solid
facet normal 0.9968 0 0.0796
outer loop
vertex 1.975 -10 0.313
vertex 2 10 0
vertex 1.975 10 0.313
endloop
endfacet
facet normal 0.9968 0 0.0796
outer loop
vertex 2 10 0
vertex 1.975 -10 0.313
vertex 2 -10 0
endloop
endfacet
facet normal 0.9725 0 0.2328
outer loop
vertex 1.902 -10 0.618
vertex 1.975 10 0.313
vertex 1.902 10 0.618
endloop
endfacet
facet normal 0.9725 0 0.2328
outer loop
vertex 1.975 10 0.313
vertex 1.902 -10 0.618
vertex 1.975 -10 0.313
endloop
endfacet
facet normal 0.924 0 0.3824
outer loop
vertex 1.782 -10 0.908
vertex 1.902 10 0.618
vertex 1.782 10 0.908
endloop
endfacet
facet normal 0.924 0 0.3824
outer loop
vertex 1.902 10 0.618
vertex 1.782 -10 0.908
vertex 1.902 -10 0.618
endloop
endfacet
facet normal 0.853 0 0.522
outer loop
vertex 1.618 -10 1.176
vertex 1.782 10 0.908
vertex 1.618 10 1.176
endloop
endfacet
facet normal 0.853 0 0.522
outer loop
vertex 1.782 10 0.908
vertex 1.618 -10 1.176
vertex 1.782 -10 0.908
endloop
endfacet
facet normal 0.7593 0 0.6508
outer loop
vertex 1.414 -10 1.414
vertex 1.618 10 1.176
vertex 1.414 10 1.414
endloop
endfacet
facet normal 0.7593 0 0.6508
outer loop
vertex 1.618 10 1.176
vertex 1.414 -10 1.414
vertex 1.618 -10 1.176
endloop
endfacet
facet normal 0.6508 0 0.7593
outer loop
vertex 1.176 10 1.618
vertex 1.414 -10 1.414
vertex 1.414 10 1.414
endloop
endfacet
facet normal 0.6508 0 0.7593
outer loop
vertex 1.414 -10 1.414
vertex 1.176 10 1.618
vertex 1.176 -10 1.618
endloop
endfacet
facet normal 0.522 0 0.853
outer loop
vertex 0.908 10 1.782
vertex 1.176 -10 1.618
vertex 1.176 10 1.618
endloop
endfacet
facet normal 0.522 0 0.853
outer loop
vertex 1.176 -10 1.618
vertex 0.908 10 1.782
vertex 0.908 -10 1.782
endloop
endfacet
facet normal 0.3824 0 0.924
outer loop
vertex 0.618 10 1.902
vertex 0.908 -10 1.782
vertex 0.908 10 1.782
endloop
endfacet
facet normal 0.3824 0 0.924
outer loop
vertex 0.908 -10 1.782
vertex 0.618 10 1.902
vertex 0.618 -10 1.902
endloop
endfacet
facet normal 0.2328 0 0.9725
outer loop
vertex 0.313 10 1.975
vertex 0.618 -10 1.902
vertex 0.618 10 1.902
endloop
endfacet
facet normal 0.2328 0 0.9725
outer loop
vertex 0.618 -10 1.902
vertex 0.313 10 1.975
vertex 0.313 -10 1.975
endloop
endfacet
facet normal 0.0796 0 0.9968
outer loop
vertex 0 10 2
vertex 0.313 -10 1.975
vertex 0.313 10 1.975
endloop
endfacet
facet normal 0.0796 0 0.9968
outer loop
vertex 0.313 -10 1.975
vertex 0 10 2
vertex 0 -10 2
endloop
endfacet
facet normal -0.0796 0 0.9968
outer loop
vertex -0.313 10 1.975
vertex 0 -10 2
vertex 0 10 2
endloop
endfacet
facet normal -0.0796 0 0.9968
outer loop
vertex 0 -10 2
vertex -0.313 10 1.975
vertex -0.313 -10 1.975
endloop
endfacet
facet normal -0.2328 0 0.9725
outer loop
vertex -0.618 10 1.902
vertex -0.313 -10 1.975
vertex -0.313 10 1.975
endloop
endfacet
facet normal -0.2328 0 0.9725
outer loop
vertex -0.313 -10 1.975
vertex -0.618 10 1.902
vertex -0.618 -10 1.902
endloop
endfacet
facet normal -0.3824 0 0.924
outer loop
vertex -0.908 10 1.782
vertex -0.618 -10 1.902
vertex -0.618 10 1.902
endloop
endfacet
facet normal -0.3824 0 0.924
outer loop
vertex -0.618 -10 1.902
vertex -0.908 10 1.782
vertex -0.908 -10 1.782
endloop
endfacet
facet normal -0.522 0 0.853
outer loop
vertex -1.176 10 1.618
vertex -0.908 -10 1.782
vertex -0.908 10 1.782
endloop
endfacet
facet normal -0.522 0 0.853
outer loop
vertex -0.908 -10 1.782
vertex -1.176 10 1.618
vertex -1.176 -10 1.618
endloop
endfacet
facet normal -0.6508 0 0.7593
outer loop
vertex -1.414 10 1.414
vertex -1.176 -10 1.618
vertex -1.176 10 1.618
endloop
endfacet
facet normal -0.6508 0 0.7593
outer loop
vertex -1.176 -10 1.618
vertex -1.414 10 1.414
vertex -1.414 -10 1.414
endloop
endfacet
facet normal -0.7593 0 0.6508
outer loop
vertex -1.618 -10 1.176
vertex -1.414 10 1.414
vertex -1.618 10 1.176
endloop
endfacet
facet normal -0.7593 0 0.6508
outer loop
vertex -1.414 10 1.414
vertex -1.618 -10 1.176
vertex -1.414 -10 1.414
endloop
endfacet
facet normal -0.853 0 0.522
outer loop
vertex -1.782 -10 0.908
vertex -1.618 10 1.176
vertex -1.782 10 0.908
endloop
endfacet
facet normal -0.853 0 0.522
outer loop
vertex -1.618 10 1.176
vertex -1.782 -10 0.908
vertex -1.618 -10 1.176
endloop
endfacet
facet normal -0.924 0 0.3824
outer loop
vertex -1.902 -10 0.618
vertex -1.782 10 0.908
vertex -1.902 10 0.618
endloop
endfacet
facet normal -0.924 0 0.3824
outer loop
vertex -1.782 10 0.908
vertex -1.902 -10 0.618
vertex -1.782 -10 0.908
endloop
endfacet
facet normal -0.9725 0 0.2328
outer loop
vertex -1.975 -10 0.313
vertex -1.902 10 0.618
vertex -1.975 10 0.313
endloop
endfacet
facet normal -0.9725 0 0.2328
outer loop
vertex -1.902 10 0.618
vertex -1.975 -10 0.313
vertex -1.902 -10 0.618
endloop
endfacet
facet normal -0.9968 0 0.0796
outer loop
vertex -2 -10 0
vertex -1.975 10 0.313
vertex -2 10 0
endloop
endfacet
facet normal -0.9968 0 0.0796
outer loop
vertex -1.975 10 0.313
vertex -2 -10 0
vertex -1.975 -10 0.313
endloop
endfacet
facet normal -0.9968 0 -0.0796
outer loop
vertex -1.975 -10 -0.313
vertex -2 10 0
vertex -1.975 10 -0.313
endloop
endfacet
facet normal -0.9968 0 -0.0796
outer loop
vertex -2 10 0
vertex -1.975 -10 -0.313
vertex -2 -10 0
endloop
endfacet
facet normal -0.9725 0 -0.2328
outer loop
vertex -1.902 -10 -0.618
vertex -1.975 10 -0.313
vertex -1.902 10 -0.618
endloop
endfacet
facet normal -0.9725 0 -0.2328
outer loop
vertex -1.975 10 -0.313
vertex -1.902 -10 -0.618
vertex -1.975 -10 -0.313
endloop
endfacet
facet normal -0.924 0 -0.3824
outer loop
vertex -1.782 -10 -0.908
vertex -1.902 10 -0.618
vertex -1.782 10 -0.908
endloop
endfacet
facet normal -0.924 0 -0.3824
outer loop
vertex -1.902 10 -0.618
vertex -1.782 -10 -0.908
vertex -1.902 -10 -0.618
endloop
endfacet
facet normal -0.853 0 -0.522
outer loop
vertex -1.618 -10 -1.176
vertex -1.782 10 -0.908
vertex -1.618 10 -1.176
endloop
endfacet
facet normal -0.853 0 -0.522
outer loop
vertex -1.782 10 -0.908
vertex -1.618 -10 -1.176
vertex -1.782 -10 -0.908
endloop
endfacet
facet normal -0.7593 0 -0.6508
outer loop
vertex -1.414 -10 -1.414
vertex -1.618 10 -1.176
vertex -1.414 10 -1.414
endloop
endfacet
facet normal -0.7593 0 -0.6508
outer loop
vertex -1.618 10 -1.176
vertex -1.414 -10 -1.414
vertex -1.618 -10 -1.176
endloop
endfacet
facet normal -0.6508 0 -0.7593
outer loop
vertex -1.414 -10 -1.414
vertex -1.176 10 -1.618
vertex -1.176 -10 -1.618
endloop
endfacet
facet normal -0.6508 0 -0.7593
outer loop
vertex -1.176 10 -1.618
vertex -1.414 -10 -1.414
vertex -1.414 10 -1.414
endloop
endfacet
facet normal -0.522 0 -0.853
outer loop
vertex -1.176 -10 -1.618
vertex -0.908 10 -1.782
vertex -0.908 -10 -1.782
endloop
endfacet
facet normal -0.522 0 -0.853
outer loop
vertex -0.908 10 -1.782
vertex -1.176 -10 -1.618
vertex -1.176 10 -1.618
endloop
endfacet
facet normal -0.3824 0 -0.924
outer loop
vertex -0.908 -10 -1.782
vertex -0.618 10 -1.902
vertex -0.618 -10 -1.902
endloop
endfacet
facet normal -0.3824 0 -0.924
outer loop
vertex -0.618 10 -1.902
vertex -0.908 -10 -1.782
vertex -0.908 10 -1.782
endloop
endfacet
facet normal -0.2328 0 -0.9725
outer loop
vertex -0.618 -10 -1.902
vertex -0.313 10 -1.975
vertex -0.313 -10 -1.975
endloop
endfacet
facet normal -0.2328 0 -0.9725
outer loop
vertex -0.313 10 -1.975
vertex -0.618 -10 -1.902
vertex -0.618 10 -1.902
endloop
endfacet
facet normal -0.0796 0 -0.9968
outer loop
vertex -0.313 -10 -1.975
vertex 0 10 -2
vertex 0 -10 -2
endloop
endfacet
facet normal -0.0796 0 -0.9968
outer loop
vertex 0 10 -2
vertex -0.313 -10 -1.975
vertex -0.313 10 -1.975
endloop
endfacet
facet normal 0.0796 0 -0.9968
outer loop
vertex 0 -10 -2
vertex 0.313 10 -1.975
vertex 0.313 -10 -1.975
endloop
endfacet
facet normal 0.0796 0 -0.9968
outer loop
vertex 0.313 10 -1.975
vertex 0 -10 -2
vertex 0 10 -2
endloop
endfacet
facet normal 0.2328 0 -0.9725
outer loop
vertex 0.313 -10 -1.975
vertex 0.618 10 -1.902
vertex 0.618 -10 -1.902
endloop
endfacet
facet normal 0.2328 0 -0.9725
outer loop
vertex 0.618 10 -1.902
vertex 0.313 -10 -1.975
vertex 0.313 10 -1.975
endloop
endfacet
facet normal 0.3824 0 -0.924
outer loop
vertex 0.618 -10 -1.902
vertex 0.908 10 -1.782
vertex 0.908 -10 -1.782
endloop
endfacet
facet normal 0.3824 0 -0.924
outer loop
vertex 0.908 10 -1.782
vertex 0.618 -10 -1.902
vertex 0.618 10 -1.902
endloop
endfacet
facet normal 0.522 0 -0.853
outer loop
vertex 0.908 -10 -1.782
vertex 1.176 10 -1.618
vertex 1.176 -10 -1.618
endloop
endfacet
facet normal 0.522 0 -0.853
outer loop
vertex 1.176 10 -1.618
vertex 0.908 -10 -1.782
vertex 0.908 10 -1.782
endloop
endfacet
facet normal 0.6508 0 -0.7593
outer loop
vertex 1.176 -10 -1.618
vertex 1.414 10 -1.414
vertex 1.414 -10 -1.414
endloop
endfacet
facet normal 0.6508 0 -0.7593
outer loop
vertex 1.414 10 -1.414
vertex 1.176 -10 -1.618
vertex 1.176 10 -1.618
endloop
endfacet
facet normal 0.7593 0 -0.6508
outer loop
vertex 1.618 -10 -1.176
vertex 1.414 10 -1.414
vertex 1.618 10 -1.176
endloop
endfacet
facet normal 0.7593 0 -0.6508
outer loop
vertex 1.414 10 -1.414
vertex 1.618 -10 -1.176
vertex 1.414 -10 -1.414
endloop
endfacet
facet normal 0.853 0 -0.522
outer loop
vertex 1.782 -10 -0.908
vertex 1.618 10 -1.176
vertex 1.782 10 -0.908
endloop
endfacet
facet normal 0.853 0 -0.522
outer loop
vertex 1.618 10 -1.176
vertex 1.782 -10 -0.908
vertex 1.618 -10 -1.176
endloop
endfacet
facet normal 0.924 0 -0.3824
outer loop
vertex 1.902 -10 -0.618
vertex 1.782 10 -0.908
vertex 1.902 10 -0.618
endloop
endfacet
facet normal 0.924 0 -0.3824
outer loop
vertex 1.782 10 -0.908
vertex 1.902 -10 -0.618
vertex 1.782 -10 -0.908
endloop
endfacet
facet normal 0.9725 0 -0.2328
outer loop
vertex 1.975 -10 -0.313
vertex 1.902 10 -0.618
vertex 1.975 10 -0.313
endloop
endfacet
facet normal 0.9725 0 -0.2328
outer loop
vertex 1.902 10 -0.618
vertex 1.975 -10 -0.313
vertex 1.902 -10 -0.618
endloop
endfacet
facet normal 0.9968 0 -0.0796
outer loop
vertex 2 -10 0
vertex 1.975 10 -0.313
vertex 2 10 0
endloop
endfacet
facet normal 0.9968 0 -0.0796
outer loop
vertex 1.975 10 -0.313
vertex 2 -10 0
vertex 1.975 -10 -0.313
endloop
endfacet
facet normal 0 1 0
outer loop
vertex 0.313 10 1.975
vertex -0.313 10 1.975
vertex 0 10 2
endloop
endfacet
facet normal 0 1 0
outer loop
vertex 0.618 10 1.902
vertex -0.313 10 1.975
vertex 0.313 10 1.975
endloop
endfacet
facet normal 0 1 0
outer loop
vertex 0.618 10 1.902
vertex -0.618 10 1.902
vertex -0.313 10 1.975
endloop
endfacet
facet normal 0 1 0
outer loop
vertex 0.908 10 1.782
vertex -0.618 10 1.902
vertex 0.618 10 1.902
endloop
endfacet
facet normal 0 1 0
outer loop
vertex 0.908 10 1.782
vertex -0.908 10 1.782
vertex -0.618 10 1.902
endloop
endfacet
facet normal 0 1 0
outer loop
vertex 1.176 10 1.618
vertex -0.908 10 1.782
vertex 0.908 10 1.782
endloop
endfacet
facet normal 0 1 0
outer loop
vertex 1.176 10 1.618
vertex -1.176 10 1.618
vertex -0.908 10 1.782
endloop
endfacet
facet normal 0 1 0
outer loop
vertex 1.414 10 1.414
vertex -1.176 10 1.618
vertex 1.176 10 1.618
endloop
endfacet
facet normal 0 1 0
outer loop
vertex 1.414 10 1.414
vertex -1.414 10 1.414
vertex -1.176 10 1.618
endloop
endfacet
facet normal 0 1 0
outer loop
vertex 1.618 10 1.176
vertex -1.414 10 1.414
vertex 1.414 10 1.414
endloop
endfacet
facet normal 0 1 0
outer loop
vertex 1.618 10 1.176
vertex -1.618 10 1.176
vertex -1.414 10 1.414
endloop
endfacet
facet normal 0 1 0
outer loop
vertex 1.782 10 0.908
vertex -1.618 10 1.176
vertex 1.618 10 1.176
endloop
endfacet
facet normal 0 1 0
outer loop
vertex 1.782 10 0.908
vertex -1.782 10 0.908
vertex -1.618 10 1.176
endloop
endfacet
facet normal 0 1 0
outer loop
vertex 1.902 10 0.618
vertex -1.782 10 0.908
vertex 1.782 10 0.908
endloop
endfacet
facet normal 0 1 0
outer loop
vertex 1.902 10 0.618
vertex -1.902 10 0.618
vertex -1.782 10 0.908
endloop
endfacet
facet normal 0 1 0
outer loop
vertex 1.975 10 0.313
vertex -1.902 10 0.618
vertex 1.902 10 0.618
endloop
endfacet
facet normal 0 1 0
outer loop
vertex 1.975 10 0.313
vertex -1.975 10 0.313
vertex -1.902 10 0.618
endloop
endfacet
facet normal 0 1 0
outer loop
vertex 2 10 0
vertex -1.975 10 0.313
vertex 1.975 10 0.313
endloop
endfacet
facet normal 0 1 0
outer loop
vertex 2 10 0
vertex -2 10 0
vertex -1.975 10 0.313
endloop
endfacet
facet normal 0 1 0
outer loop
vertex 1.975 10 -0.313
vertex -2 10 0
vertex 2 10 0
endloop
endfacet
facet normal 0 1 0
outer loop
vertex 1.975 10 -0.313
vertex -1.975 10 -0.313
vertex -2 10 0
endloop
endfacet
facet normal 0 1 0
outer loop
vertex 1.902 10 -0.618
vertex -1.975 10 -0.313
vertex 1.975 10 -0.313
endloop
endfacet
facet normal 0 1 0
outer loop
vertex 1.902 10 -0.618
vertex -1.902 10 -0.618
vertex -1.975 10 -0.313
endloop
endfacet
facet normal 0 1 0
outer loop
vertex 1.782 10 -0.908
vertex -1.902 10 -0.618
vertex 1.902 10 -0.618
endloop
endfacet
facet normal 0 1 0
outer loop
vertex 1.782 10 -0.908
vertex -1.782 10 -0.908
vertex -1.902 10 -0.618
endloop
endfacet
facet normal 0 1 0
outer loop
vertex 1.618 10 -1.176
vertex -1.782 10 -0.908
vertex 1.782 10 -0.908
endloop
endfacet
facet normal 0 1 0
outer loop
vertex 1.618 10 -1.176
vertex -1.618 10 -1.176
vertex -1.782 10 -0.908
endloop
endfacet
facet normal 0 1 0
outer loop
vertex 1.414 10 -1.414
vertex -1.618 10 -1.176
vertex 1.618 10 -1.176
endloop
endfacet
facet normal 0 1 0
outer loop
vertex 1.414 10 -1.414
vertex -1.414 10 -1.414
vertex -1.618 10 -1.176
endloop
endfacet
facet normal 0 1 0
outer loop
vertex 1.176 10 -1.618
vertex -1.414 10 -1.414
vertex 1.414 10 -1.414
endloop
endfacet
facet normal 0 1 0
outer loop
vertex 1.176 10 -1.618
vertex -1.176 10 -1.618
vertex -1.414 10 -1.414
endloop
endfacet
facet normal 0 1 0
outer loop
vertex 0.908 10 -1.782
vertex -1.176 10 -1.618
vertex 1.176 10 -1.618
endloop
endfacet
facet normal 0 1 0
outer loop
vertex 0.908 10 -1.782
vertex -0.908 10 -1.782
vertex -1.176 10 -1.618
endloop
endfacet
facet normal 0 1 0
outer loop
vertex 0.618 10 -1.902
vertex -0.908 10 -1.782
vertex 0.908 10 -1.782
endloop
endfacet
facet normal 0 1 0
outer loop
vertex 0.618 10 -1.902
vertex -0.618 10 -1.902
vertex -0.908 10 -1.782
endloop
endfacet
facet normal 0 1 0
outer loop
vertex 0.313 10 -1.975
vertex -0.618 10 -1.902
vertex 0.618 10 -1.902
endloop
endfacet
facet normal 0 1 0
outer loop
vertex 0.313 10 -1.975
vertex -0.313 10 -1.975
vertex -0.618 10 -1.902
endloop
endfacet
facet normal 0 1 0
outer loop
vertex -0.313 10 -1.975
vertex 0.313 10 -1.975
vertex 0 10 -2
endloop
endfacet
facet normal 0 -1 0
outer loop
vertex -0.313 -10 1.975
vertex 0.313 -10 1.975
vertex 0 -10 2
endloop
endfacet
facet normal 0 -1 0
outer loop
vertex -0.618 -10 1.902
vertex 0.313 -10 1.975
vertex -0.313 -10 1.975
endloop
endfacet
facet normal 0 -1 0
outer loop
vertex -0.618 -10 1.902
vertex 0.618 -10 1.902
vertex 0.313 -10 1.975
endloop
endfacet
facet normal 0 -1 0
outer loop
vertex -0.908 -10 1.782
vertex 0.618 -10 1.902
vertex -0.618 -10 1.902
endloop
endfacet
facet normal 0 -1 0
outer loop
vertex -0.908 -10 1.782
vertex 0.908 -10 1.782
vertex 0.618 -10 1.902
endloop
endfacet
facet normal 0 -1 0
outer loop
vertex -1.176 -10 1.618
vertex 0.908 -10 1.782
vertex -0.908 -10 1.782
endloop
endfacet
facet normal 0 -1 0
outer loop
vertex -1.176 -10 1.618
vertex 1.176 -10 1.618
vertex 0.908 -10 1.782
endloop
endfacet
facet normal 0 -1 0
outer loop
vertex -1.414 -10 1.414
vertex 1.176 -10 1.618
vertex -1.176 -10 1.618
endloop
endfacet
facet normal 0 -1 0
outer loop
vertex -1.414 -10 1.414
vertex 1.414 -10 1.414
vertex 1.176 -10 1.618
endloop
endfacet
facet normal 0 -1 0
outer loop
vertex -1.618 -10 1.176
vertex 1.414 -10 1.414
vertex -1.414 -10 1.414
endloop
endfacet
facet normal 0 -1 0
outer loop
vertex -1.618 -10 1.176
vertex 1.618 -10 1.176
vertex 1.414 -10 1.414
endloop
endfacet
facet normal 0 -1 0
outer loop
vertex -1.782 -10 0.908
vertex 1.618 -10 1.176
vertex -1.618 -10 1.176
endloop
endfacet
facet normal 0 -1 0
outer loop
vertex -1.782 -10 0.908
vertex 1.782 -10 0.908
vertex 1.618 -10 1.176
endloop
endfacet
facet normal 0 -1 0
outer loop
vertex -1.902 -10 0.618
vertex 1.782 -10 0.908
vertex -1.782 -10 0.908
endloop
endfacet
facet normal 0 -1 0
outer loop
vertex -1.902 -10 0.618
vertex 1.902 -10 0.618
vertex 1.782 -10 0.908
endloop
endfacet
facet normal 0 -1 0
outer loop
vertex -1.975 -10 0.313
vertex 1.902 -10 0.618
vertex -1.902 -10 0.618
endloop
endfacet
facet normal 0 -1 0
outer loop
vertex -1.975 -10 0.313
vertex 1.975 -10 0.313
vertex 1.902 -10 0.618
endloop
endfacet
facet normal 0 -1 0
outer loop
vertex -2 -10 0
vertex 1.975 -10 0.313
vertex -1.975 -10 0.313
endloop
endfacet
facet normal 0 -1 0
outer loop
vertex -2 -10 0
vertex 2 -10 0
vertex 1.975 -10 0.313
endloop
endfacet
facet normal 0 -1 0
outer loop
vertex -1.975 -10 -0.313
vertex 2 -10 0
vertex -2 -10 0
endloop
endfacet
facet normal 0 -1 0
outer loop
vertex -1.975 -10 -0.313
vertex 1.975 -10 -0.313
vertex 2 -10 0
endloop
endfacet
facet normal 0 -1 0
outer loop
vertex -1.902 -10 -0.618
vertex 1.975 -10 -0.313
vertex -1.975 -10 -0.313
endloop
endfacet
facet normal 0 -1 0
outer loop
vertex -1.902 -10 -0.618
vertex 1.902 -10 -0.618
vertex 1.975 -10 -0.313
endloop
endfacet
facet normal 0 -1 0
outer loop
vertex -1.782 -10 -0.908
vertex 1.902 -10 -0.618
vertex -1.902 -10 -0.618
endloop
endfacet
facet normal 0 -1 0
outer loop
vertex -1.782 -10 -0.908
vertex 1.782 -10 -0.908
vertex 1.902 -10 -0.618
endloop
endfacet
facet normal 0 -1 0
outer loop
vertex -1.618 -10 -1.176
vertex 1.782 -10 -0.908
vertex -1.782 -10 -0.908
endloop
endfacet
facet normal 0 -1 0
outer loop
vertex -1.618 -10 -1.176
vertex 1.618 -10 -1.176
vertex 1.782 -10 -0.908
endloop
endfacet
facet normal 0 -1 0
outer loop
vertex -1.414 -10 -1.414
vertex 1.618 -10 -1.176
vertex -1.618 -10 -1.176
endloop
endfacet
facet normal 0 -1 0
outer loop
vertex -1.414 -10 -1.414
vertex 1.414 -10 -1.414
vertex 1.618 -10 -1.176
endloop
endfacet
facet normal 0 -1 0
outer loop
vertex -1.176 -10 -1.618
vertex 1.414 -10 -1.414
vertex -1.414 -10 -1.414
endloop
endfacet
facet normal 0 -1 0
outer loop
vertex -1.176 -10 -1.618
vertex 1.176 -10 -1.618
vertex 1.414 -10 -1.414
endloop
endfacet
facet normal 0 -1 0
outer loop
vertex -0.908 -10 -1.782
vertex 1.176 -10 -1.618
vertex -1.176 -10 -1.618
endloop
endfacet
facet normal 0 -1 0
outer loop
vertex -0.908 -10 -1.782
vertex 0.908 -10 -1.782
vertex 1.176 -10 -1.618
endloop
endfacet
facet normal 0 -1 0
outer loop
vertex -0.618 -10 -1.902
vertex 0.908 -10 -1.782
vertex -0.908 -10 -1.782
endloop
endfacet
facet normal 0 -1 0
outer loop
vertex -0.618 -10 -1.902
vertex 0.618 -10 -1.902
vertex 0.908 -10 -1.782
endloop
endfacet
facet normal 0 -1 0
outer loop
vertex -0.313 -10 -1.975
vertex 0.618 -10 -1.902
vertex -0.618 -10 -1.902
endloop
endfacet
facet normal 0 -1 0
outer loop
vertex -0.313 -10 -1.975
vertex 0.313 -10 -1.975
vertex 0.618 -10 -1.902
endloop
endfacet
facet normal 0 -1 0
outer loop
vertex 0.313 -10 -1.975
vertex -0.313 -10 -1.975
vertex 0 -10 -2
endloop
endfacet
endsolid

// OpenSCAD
// Unit of length: Unit.MM
difference()
{
   cube(size = 10.0, center = true);
   translate(v = [0.0, 0.0, 5.0])
   {
      !union()
      {
         rotate(a = [90.0, 0.0, 0.0])
         {
            #union()
            {
               cylinder(h = 20.0, d = 4.0, center = true, $fn = 40);
            }
         }
      }
   }
}
